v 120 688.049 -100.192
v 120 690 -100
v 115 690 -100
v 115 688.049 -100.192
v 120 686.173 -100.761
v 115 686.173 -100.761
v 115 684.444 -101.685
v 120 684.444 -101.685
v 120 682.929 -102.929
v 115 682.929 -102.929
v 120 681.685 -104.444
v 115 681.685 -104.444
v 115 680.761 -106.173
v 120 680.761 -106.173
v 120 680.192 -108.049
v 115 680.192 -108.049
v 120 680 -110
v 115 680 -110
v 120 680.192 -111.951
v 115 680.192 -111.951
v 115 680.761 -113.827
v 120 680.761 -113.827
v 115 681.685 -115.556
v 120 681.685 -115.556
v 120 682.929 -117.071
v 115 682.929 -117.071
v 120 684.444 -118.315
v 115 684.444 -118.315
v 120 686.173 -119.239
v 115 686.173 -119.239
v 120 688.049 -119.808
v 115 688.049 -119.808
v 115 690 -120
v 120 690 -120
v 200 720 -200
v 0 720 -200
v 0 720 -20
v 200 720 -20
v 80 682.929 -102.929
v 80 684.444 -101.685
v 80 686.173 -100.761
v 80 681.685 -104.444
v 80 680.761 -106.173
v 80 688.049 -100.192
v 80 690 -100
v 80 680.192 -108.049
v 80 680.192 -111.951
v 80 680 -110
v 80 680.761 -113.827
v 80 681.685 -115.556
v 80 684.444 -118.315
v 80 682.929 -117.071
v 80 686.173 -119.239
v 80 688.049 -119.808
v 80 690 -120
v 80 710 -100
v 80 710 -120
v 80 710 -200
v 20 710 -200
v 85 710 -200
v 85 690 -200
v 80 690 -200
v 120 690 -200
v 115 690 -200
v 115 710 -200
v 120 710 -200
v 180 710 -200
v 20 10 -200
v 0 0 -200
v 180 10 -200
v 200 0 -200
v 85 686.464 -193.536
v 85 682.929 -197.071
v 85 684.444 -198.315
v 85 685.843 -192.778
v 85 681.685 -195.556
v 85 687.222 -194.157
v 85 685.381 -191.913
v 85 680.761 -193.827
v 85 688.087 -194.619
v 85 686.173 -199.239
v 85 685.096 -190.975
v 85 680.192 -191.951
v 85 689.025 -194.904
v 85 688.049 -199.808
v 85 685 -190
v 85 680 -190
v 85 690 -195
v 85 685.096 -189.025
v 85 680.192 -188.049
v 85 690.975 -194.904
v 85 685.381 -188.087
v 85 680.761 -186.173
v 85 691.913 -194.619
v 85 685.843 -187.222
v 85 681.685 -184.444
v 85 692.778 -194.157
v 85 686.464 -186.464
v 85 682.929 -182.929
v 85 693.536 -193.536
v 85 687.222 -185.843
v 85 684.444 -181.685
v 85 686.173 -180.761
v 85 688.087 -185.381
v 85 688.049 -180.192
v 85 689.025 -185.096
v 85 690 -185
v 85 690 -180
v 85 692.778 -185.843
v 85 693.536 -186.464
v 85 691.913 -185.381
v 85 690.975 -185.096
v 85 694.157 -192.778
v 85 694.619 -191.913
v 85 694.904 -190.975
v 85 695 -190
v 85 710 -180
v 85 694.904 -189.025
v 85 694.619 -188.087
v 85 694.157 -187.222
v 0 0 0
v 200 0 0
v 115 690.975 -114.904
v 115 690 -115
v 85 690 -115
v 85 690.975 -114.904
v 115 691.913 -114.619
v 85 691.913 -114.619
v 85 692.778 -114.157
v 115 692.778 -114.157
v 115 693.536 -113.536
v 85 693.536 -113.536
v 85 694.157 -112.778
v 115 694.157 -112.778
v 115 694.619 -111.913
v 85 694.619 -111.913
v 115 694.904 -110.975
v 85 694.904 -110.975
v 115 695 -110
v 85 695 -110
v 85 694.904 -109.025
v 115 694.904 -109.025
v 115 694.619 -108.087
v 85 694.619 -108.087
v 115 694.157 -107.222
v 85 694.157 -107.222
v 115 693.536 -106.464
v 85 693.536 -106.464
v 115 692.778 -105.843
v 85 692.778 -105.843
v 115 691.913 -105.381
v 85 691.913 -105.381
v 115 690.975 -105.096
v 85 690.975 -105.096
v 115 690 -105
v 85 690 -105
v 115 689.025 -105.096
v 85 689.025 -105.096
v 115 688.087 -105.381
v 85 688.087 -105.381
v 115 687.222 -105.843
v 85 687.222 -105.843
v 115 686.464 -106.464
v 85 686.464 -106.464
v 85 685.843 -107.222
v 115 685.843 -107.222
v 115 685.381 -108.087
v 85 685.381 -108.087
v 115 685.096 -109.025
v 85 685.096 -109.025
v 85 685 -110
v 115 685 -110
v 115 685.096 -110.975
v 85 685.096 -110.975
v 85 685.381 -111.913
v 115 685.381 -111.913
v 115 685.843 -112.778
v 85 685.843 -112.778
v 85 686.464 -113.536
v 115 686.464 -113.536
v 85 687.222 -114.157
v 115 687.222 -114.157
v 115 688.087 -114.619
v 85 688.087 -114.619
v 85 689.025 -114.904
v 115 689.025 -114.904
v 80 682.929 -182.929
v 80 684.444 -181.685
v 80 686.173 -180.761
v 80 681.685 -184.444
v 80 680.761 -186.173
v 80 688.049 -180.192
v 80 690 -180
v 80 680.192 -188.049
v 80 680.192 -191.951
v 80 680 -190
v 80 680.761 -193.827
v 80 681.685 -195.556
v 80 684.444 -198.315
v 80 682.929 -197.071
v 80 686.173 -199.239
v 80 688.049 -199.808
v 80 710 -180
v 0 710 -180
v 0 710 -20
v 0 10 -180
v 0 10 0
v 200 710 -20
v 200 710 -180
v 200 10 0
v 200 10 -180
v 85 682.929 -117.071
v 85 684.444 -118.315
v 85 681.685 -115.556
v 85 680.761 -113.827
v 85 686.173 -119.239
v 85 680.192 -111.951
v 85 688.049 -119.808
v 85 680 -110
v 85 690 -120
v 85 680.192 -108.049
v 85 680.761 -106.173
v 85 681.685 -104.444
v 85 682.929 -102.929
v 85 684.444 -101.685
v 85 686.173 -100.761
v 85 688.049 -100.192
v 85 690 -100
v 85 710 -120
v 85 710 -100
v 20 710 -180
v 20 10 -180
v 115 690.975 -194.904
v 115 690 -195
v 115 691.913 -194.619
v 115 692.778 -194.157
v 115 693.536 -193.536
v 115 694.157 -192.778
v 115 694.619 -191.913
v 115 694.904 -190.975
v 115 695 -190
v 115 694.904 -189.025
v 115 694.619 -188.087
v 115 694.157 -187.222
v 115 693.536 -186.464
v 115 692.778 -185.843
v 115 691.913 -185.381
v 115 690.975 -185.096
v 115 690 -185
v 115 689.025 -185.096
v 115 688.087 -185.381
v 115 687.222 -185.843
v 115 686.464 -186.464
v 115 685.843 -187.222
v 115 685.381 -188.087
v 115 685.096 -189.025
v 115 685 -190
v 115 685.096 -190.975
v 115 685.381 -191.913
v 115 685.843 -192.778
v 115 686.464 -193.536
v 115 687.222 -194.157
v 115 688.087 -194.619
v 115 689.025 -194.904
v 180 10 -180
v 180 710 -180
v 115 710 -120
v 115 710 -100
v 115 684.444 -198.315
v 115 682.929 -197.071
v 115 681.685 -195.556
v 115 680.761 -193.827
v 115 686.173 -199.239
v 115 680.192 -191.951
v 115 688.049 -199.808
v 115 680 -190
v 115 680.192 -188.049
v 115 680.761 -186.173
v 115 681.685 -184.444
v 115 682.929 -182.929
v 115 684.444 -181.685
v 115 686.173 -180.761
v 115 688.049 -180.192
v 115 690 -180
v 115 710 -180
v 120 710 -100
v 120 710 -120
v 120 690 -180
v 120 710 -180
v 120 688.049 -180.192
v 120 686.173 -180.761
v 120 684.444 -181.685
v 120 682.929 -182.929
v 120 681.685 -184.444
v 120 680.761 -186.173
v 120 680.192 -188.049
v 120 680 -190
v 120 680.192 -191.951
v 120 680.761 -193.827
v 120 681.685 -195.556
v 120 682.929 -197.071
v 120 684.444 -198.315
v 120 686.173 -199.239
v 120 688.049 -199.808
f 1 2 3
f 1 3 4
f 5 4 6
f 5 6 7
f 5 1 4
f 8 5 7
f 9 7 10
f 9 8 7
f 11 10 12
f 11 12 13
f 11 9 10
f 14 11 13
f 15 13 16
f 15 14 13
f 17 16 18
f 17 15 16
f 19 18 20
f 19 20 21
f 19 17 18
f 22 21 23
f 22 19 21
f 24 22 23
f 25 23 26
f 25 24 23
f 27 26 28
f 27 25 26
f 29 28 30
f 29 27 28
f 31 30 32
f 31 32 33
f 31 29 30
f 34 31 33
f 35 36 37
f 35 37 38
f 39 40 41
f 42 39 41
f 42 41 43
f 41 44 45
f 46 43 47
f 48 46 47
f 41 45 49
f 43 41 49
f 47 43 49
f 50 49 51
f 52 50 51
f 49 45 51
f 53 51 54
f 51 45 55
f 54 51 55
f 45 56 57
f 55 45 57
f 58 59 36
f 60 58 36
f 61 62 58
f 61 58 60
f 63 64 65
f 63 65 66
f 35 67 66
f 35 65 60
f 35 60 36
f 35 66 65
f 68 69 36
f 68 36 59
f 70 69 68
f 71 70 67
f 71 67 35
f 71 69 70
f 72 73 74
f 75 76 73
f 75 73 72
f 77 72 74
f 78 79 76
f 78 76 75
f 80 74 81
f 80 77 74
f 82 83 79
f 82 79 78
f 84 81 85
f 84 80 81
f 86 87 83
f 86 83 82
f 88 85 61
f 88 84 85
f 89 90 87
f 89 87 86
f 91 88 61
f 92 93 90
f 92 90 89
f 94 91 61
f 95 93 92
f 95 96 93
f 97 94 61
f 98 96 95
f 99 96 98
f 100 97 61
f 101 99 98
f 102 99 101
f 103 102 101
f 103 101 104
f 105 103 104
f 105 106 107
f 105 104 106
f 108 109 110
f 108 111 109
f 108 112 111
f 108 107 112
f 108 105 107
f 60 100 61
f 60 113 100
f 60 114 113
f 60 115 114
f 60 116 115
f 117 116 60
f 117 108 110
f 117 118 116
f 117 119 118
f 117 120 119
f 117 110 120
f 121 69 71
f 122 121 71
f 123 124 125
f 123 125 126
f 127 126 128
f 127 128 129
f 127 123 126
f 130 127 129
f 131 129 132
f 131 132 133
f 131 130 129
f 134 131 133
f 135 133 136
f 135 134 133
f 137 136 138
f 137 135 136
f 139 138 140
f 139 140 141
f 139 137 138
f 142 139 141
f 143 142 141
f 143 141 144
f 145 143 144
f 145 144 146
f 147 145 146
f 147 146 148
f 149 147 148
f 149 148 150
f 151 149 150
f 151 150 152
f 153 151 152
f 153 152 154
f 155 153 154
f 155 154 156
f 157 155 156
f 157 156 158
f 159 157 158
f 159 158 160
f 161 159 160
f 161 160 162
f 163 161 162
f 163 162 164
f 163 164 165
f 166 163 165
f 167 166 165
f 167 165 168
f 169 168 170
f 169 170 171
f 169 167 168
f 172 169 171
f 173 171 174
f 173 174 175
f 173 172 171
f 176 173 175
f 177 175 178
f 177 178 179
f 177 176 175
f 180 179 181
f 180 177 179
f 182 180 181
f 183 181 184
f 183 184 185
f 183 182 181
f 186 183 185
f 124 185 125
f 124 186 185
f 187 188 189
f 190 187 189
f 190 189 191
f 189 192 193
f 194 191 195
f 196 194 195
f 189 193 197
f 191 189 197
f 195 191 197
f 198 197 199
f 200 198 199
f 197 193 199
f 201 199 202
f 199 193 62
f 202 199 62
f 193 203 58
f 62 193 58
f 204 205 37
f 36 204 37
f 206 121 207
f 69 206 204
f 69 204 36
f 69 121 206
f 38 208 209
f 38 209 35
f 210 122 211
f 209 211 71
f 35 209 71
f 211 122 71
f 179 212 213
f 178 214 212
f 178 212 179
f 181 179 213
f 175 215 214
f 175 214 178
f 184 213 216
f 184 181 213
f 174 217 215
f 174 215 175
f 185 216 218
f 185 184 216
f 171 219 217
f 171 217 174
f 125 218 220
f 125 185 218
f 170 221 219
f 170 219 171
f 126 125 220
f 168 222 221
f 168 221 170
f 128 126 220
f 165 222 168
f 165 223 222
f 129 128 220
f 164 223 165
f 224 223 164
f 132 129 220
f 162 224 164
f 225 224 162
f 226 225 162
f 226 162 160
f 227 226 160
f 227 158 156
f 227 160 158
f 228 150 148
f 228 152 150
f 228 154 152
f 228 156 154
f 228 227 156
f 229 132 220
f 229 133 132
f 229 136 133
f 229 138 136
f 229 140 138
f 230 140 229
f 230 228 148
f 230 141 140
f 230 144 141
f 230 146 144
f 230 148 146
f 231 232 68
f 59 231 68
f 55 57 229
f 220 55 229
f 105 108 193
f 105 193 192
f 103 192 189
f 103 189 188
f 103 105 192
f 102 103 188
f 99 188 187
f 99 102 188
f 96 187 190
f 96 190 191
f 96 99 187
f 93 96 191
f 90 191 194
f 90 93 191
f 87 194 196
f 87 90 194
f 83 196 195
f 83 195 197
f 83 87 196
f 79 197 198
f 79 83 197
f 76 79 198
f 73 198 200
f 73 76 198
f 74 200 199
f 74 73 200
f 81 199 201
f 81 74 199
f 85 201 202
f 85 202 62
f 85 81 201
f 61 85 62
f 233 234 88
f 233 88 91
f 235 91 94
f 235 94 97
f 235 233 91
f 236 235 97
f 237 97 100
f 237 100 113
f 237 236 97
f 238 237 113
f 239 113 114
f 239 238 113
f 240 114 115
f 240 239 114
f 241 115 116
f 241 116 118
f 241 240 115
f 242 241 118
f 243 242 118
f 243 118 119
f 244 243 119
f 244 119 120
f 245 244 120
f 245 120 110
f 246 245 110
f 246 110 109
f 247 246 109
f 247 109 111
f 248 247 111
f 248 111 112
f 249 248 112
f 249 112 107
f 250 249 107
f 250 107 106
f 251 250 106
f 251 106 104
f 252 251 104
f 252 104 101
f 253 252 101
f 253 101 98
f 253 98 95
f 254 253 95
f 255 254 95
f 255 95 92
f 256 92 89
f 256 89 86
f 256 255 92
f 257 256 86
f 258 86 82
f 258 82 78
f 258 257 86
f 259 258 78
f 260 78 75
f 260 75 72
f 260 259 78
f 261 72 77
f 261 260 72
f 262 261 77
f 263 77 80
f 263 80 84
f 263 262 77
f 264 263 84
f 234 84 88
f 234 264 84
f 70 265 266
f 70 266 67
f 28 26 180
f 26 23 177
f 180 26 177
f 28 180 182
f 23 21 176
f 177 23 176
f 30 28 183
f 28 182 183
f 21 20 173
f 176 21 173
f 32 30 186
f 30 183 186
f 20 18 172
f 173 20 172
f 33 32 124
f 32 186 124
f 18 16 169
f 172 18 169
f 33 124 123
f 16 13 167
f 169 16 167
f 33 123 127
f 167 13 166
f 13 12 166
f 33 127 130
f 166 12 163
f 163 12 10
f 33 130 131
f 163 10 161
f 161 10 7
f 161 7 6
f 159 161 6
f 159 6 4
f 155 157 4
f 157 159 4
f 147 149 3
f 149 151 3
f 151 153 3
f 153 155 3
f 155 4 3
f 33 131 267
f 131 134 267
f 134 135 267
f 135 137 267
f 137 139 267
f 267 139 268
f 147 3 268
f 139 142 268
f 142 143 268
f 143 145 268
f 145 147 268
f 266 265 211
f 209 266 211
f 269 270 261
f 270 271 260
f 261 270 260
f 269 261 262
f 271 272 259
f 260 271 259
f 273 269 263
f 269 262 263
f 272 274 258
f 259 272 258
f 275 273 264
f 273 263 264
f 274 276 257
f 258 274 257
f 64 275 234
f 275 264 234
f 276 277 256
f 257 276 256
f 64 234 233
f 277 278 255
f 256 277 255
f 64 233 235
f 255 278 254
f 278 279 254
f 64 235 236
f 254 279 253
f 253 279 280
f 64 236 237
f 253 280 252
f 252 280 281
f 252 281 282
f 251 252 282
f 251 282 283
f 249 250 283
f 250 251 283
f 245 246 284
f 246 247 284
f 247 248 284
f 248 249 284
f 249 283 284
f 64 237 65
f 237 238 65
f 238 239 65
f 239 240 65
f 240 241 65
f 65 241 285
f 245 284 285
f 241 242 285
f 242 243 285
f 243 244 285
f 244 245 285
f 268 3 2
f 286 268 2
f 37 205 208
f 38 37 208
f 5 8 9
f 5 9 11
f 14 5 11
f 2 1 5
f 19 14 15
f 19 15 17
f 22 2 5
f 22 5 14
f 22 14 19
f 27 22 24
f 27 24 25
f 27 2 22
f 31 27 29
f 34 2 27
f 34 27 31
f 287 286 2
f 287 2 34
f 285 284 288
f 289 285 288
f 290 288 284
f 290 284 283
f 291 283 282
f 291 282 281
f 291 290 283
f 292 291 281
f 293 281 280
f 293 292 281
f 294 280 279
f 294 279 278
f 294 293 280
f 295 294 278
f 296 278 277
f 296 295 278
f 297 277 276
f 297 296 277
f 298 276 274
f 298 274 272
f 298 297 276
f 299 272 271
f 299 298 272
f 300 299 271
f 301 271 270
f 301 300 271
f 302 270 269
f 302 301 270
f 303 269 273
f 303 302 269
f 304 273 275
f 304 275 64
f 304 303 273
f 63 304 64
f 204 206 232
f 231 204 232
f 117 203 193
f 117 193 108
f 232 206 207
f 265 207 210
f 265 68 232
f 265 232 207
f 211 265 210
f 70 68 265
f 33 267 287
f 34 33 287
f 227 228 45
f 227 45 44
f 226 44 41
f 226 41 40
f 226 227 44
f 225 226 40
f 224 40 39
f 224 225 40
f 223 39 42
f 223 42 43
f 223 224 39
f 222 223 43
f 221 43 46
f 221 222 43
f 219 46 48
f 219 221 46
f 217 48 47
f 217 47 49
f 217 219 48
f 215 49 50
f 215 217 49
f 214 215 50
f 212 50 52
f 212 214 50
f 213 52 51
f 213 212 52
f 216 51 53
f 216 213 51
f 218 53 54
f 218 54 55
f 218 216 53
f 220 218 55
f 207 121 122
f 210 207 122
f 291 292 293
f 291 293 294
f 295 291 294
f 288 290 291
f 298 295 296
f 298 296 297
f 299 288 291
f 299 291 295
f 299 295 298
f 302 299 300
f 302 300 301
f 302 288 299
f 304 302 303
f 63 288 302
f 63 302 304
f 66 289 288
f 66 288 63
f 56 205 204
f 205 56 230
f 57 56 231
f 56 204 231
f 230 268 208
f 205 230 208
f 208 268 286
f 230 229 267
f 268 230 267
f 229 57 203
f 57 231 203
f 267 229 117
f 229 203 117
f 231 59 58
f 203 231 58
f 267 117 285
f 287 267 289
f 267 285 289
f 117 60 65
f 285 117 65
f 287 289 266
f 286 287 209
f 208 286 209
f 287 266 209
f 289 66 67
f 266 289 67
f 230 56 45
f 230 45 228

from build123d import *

# Parameters (mm, degrees)
SKETCH2_W           = 200
SKETCH2_H           = 200
BOSS_EXTRUDE1_DEPTH = 10
SKETCH3_W           = 20
SKETCH3_H           = 20
BOSS_EXTRUDE2_DEPTH = 700
SKETCH4_W           = 200
SKETCH4_H           = 180
BOSS_EXTRUDE3_DEPTH = 10
SKETCH5_W           = 40
SKETCH5_H           = 10
BOSS_EXTRUDE4_DEPTH = 20
SKETCH7_R           = 10
BOSS_EXTRUDE7_DEPTH = 40
SKETCH10_W          = 30
SKETCH10_H          = 40.281697436
CUT_EXTRUDE2_DEPTH  = 754.923072999
SKETCH11_R          = 5
BOSS_EXTRUDE9_DEPTH = 40
LPATTERN1_COUNT     = 2
LPATTERN1_PITCH     = 80


with BuildPart() as part:
    # Sketch2 → Boss-Extrude1 (new body)
    with BuildSketch(Plane(origin=(0, 0, 0), x_dir=(1, 0, 0), z_dir=(0, 1, 0))):
        with Locations((100, 100)):
            Rectangle(SKETCH2_W, SKETCH2_H)
    extrude(amount=BOSS_EXTRUDE1_DEPTH)

    # Sketch3 → Boss-Extrude2 (add)
    with BuildSketch(Plane(origin=(0, 10, 0), x_dir=(1, 0, 0), z_dir=(0, 1, 0))):
        with Locations((190, 190)):
            Rectangle(SKETCH3_W, SKETCH3_H)
        with Locations((10, 190)):
            Rectangle(SKETCH3_W, SKETCH3_H)
    extrude(amount=BOSS_EXTRUDE2_DEPTH)

    # Sketch4 → Boss-Extrude3 (add)
    with BuildSketch(Plane(origin=(0, 710, 0), x_dir=(1, 0, 0), z_dir=(0, 1, 0))):
        with Locations((100, 110)):
            Rectangle(SKETCH4_W, SKETCH4_H)
    extrude(amount=BOSS_EXTRUDE3_DEPTH)

    # Sketch5 → Boss-Extrude4 (add)
    with BuildSketch(Plane.XZ.offset(-710)):
        with Locations((100, -105)):
            Rectangle(SKETCH5_W, SKETCH5_H)
        with Locations((100, -115)):
            Rectangle(SKETCH5_W, SKETCH5_H)
    boss_extrude4 = extrude(amount=BOSS_EXTRUDE4_DEPTH)

    # Sketch7 → Boss-Extrude7 (add)
    with BuildSketch(Plane(origin=(120, 0, 0), x_dir=(0, 0, -1), z_dir=(1, 0, 0))):
        with Locations((110, 690)):
            Circle(SKETCH7_R)
    boss_extrude7 = extrude(amount=-BOSS_EXTRUDE7_DEPTH)

    # Sketch10 → Cut-Extrude2 (cut, through all)
    with BuildSketch(Plane.XY.offset(-100)):
        with Locations((100, 689.859151282)):
            Rectangle(SKETCH10_W, SKETCH10_H)
    cut_extrude2 = extrude(amount=-CUT_EXTRUDE2_DEPTH, mode=Mode.SUBTRACT)

    # Sketch11 → Boss-Extrude9 (add)
    with BuildSketch(Plane(origin=(120, 0, 0), x_dir=(0, 0, -1), z_dir=(1, 0, 0))):
        with Locations((110, 690)):
            Circle(SKETCH11_R)
    boss_extrude9 = extrude(amount=-BOSS_EXTRUDE9_DEPTH)

    # LPattern1: Boss-Extrude4, Boss-Extrude7, Cut-Extrude2, Boss-Extrude9 ×2
    with Locations(*[(0, 0, -i * LPATTERN1_PITCH) for i in range(1, LPATTERN1_COUNT)]):
        add(boss_extrude4)
        add(boss_extrude7)
        add(cut_extrude2, mode=Mode.SUBTRACT)
        add(boss_extrude9)


solid = part.part
